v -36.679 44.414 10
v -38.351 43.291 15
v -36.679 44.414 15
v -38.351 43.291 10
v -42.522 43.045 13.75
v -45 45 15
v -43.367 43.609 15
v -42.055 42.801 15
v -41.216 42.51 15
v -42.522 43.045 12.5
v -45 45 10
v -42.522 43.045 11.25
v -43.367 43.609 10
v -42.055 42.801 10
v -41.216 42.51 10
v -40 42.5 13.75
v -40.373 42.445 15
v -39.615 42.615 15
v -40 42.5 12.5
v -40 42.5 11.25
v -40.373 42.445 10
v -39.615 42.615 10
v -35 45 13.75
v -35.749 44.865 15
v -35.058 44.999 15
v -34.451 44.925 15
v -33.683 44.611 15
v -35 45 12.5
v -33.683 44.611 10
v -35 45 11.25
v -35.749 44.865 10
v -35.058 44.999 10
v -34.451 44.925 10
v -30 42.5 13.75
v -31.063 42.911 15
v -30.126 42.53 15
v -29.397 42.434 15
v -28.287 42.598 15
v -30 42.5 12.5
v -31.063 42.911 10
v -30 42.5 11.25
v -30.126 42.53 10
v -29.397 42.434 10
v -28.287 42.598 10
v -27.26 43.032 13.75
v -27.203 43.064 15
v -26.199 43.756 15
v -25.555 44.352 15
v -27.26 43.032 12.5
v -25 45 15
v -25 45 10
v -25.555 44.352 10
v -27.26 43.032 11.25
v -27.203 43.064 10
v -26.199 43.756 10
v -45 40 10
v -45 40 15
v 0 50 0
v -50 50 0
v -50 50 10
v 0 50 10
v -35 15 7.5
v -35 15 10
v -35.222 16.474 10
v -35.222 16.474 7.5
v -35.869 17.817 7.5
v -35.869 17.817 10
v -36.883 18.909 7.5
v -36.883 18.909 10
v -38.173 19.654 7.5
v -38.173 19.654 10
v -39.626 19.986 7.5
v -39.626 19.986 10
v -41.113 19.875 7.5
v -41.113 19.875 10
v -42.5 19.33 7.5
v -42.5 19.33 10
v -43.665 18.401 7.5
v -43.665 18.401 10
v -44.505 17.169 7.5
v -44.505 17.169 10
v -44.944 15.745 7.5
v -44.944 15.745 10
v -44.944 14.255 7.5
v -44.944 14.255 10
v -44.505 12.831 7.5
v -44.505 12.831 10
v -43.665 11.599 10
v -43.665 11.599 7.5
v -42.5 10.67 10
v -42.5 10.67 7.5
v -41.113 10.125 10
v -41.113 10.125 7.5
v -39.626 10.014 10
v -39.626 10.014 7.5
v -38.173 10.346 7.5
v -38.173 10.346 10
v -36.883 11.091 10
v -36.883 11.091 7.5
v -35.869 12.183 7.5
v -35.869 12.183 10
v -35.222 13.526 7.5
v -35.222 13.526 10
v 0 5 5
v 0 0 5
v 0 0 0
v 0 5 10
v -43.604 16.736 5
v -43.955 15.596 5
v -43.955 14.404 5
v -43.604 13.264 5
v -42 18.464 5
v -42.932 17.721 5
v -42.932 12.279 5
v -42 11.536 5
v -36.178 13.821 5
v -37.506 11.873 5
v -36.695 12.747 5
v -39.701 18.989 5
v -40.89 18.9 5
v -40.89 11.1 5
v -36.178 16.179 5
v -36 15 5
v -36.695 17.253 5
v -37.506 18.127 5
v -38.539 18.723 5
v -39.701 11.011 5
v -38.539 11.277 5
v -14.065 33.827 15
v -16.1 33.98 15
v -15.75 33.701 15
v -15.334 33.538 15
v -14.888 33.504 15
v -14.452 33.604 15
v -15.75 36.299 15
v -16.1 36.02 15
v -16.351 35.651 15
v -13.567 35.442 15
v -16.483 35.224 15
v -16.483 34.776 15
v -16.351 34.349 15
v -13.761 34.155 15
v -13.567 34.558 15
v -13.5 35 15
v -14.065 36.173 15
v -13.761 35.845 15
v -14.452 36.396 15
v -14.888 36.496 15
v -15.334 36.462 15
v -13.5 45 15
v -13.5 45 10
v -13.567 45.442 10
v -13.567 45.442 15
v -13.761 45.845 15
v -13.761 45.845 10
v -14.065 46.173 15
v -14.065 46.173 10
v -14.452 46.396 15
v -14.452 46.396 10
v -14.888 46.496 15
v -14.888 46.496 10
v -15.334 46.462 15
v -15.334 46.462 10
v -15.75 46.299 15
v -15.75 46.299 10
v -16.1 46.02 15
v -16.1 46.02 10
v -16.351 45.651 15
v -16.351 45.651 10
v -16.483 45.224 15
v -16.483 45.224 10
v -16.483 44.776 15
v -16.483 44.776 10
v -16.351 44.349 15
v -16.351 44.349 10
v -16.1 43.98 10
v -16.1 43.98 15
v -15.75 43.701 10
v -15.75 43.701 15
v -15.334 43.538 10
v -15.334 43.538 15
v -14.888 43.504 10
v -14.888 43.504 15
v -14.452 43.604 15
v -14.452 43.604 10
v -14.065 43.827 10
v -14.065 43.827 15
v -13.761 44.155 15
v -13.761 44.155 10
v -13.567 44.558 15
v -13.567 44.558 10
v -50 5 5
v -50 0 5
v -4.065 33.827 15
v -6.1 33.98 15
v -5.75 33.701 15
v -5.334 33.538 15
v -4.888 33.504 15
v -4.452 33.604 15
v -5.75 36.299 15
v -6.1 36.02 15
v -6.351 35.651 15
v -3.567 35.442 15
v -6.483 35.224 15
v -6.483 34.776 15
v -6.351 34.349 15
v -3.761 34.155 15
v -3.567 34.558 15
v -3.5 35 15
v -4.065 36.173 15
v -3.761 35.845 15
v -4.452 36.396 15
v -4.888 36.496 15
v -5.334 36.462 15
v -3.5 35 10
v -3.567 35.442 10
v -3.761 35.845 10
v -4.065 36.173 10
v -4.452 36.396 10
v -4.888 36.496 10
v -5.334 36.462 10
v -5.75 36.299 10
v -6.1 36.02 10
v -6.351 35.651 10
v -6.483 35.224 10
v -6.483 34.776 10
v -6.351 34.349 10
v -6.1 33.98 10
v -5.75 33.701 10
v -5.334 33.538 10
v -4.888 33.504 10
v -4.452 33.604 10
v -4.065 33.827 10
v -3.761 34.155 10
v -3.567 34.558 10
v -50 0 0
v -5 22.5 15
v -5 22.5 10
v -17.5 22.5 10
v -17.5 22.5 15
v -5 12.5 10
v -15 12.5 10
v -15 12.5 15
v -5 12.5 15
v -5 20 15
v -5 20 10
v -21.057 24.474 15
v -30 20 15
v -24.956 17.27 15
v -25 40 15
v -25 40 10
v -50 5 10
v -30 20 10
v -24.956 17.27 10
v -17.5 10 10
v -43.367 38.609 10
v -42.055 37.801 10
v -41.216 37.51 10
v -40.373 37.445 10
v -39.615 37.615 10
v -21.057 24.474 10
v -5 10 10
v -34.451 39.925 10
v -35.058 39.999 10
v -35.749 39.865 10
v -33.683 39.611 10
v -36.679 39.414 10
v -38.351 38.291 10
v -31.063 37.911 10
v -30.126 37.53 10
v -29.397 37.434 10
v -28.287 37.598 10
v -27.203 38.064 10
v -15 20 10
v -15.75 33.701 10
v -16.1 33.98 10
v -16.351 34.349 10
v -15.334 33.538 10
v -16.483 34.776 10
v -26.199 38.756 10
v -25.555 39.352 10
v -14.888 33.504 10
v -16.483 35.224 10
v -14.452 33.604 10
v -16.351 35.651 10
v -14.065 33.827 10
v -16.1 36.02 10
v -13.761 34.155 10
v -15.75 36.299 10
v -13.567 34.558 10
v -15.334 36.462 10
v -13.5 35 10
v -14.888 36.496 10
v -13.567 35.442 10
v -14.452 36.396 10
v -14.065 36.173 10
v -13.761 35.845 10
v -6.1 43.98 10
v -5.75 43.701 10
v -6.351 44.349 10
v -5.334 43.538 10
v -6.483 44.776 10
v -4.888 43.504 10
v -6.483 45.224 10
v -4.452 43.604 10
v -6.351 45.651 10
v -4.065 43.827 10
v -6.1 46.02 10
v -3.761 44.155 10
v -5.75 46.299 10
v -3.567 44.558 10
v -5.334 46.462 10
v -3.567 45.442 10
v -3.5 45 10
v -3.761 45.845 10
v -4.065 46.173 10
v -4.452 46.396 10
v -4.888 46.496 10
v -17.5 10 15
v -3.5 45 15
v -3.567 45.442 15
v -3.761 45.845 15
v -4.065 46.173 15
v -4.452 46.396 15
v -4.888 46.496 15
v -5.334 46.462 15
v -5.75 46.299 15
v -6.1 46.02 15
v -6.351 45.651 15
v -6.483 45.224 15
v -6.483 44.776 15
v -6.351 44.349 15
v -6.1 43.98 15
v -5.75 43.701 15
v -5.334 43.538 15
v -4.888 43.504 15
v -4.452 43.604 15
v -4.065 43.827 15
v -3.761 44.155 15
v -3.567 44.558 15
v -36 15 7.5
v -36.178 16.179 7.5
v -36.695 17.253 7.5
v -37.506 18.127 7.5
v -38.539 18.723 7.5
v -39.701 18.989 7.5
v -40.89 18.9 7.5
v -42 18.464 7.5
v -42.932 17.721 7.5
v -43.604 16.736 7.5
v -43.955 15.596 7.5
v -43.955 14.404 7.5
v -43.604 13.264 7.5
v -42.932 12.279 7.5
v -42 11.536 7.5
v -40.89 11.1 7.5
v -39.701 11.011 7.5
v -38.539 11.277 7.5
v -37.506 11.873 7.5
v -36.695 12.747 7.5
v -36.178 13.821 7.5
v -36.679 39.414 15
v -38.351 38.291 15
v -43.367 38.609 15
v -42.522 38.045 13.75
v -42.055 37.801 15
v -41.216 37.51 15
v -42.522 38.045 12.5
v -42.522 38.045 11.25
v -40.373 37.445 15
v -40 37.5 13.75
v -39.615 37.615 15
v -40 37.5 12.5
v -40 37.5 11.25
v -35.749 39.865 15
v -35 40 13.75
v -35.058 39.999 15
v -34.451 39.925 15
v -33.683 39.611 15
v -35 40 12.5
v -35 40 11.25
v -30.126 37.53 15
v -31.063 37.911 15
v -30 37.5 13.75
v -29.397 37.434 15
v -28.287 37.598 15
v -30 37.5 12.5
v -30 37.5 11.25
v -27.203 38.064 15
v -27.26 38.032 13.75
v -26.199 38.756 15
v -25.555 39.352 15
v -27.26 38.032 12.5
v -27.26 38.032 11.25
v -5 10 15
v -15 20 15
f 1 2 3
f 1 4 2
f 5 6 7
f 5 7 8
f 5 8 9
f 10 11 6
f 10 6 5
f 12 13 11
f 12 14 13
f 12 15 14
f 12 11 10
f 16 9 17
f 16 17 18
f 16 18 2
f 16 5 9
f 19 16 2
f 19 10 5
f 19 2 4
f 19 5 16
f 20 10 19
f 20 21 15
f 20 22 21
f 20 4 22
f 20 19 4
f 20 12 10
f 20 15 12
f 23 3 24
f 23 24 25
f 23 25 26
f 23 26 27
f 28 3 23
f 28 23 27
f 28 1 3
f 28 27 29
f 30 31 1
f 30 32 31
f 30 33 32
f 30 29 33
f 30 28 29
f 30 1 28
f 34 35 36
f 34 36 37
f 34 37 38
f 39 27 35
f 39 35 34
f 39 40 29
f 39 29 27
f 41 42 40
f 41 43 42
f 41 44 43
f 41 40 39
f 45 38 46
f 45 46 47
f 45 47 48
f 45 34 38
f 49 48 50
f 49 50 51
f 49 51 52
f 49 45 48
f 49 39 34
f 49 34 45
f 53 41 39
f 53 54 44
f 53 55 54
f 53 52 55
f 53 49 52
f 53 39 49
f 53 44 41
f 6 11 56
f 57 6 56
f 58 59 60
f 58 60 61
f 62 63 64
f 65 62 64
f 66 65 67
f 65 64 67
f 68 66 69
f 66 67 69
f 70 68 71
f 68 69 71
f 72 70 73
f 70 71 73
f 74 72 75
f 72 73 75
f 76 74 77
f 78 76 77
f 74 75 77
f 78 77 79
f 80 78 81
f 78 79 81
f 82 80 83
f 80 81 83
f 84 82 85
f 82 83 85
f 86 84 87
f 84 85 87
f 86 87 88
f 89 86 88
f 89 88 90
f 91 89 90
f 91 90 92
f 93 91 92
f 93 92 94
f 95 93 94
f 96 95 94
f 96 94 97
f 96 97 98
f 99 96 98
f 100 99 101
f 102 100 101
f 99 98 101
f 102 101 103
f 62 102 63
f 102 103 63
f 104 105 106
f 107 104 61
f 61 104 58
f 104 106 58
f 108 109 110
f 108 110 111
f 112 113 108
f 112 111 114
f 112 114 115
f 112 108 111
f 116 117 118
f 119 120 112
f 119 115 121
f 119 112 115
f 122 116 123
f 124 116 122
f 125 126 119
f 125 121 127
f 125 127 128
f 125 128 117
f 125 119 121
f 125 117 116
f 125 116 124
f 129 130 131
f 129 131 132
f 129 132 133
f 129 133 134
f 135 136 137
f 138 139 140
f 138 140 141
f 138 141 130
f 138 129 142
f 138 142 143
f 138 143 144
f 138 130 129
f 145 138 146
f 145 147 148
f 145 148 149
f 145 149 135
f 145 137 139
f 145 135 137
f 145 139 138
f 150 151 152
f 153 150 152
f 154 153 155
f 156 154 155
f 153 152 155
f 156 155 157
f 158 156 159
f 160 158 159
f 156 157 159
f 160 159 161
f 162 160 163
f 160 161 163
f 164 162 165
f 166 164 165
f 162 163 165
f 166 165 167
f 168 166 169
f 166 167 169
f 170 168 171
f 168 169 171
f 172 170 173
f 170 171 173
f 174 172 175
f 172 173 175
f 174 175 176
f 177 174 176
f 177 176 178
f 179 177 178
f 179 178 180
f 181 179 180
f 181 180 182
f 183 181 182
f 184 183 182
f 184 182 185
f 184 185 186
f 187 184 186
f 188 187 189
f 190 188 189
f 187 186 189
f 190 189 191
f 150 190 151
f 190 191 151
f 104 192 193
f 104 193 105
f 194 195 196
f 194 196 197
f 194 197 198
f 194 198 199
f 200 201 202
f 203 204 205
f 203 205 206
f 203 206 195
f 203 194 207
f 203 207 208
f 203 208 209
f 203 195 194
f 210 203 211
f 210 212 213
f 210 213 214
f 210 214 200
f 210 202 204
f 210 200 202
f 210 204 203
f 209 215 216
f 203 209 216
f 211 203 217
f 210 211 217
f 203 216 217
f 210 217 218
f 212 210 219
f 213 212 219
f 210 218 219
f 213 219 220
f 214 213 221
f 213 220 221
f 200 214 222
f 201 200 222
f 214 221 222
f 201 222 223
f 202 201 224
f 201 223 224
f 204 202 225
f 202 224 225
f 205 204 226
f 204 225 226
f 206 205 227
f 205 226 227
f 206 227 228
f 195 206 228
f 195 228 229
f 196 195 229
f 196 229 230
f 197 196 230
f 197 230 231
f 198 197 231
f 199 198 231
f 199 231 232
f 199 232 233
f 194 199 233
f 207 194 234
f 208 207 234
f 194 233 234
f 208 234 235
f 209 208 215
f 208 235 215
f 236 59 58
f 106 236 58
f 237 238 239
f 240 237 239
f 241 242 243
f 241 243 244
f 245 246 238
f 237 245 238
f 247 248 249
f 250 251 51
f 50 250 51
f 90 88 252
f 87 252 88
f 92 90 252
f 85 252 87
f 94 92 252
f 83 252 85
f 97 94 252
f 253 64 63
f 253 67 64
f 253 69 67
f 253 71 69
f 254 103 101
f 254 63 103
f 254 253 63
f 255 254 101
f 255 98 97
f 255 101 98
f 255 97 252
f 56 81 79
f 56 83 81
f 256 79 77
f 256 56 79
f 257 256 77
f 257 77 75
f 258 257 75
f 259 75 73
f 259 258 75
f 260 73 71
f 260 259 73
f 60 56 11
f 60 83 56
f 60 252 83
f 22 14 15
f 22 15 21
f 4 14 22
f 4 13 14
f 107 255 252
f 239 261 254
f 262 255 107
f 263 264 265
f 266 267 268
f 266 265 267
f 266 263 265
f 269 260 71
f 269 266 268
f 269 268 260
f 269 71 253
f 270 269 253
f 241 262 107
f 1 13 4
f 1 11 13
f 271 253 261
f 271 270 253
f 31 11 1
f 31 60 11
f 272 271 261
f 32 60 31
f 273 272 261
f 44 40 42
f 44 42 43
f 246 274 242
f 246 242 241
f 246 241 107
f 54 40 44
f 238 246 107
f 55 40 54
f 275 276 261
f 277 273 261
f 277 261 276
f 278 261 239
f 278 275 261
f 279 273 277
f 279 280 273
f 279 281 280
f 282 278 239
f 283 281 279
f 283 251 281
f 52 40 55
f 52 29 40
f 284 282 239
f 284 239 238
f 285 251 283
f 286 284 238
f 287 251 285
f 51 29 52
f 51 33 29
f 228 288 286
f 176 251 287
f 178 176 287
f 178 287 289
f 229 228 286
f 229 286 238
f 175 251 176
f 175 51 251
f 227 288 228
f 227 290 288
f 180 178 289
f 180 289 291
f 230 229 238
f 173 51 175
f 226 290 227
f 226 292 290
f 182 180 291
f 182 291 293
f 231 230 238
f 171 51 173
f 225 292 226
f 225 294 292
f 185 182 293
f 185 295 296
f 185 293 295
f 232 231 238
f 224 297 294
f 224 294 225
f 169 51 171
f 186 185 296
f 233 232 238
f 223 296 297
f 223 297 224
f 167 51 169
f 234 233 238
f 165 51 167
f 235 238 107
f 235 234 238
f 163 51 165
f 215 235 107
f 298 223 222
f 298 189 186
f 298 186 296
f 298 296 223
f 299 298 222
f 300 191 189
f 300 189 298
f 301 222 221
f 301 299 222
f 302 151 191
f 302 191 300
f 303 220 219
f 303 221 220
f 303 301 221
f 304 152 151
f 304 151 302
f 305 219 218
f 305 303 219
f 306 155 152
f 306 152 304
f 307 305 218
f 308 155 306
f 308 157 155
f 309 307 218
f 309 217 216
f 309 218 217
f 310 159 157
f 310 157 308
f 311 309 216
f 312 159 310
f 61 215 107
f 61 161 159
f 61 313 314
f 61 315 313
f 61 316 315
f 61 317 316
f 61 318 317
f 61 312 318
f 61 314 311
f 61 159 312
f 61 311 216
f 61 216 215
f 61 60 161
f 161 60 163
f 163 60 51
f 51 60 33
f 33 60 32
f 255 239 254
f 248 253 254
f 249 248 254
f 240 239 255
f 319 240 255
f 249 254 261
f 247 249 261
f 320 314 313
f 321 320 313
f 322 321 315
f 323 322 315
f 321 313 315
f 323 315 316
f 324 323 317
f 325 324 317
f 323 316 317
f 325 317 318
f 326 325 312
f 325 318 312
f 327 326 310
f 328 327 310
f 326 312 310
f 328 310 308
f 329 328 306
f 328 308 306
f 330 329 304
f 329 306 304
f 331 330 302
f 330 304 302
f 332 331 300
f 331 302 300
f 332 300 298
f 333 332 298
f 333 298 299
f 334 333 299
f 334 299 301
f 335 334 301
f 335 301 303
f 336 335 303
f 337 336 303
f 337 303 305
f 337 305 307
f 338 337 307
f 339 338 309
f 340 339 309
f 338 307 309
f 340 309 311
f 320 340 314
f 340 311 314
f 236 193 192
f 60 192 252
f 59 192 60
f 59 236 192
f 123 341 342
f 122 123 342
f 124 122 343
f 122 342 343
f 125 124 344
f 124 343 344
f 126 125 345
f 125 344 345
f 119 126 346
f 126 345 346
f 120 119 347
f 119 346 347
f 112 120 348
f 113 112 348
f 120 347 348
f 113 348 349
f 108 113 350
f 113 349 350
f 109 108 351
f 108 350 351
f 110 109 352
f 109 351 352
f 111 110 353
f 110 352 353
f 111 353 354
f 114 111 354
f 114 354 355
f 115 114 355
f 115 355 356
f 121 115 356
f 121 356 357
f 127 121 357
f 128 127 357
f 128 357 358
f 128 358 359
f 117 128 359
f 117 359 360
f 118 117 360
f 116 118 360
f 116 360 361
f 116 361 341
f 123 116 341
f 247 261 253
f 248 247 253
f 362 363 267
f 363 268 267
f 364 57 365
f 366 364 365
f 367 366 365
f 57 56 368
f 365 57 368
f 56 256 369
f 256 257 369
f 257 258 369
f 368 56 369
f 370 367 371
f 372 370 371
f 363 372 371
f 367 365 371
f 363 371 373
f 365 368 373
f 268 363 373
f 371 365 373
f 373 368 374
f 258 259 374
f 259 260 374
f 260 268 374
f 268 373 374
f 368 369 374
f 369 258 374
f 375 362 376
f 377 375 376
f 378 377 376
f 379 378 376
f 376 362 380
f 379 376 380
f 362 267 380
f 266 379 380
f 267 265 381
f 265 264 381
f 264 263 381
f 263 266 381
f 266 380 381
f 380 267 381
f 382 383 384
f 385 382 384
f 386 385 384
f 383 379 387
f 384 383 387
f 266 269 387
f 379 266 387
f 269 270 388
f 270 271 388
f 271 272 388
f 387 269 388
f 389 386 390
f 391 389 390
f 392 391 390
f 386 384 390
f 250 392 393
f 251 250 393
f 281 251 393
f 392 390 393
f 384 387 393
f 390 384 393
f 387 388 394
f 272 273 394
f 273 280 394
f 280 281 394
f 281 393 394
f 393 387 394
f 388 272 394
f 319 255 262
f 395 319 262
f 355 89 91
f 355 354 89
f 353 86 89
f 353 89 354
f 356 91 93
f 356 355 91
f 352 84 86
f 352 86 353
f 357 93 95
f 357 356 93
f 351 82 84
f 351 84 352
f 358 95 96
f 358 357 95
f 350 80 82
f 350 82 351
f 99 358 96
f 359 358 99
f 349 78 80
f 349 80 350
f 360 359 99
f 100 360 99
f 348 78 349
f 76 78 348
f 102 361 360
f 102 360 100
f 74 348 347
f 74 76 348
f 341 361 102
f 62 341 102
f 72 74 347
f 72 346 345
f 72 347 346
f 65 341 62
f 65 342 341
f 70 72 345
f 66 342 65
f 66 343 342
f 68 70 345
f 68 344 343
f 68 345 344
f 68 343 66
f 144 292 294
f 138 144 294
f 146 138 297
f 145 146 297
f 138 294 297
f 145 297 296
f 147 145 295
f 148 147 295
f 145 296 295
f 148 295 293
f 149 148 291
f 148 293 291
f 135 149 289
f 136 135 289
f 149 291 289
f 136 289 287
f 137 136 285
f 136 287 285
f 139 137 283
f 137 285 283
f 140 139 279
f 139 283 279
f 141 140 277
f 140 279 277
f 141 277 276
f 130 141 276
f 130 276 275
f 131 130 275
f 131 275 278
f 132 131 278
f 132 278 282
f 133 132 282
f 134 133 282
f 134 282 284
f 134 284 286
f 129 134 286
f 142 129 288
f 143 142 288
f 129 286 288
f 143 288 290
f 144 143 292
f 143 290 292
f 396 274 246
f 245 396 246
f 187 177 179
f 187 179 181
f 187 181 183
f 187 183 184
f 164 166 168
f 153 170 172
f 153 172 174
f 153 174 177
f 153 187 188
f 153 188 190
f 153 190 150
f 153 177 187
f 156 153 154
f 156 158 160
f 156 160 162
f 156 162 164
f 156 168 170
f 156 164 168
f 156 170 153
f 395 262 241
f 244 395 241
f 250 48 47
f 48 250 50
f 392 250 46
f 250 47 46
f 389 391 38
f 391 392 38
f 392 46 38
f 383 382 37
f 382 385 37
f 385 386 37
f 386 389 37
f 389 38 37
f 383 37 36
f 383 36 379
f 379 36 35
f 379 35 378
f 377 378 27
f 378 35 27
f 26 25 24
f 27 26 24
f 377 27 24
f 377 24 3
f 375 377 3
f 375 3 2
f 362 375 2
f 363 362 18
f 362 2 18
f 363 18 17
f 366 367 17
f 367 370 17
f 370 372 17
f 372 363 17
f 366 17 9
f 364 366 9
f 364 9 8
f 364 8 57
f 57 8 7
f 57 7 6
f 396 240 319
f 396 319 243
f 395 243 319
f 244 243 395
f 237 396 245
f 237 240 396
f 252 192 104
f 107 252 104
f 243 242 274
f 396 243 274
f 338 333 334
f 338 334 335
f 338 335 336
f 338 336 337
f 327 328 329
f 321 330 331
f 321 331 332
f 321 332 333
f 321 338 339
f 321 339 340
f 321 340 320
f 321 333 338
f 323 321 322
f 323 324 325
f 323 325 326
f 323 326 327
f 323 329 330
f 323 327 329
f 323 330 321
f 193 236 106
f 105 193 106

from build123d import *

# Parameters (mm, degrees)
F0_W      = 50
F0_H      = 50
F1_DEPTH  = 5
F2_W      = 50
F2_H      = 45
F3_DEPTH  = 5
F4_R      = 5
F4_R_2    = 4
F5_DEPTH  = 2.5
F6_DEPTH  = 5
F7_R      = 1.5
F8_DEPTH  = 5
F10_DEPTH = 5
F12_DEPTH = 5
F13_W     = 10
F13_H     = 2.5
F14_DEPTH = 5


with BuildPart() as f1:
    # F0 (on Top) → F1 (new body)
    with BuildSketch(Plane.XY):
        with Locations((-25, 25)):
            Rectangle(F0_W, F0_H)
    extrude(amount=F1_DEPTH)

    # F2 (on face) → F3 (join)
    with BuildSketch(Plane.XY.offset(5)):
        with Locations((-25, 27.5)):
            Rectangle(F2_W, F2_H)
    extrude(amount=F3_DEPTH)

    # F4 (on face) → F5 (cut)
    with BuildSketch(Plane.XY.offset(10)):
        with Locations((-40, 15)):
            Circle(F4_R)
        with Locations((-40, 15)):
            Circle(F4_R_2, mode=Mode.SUBTRACT)
    extrude(amount=-F5_DEPTH, mode=Mode.SUBTRACT)

    # F6 (cut): a face of the model
    f6_faces = [f1.faces().sort_by_distance(p)[0] for p in [
        (-40, 15, 10),
    ]]
    extrude(f6_faces, amount=-F6_DEPTH, mode=Mode.SUBTRACT)

    # F7 (on face) → F8 (join)
    with BuildSketch(Plane.XY.offset(10)):
        with Locations((-15, 35)):
            Circle(F7_R)
        with Locations((-5, 35)):
            Circle(F7_R)
        with Locations((-15, 45)):
            Circle(F7_R)
        with Locations((-5, 45)):
            Circle(F7_R)
    extrude(amount=F8_DEPTH)

    # F9 (on face) → F10 (join)
    with BuildSketch(Plane.XY.offset(10)):
        with BuildLine():
            add(Edge.make_bspline(
                [(-45, 45), (-43.3724021193, 43.4960327946), (-39.9998361972, 40.752966518), (-34.9419701311, 47.120567995), (-30.2322832786, 40.764761502), (-26.1633589291, 43.4685111653), (-25, 45)],
                knots=[0, 0, 0, 0, 0.25, 0.5, 0.75, 1, 1, 1, 1], degree=3))
            Line((-45, 45), (-45, 40))
            add(Edge.make_bspline(
                [(-45, 40), (-43.3724021193, 38.4960327946), (-39.9998361972, 35.752966518), (-34.9419701311, 42.120567995), (-30.2322832786, 35.764761502), (-26.1633589291, 38.4685111653), (-25, 40)],
                knots=[0, 0, 0, 0, 0.25, 0.5, 0.75, 1, 1, 1, 1], degree=3))
            Line((-25, 40), (-25, 45))
        make_face()
    extrude(amount=F10_DEPTH)

    # F11 (on face) → F12 (join)
    with BuildSketch(Plane.XY.offset(10)):
        Polygon((-21.0567055787, 24.4740903986), (-30, 20), (-24.9556113431, 17.269956793), align=None)
    extrude(amount=F12_DEPTH)

    # F13 (on face) → F14 (join)
    with BuildSketch(Plane.XY.offset(10)):
        with Locations((-10, 21.25)):
            Rectangle(F13_W, F13_H)
        Polygon((-15, 10), (-15, 12.5), (-15, 20), (-15, 22.5), (-17.5, 22.5), (-17.5, 10), align=None)
        with Locations((-10, 11.25)):
            Rectangle(F13_W, F13_H)
    extrude(amount=F14_DEPTH)


solid = f1.part
